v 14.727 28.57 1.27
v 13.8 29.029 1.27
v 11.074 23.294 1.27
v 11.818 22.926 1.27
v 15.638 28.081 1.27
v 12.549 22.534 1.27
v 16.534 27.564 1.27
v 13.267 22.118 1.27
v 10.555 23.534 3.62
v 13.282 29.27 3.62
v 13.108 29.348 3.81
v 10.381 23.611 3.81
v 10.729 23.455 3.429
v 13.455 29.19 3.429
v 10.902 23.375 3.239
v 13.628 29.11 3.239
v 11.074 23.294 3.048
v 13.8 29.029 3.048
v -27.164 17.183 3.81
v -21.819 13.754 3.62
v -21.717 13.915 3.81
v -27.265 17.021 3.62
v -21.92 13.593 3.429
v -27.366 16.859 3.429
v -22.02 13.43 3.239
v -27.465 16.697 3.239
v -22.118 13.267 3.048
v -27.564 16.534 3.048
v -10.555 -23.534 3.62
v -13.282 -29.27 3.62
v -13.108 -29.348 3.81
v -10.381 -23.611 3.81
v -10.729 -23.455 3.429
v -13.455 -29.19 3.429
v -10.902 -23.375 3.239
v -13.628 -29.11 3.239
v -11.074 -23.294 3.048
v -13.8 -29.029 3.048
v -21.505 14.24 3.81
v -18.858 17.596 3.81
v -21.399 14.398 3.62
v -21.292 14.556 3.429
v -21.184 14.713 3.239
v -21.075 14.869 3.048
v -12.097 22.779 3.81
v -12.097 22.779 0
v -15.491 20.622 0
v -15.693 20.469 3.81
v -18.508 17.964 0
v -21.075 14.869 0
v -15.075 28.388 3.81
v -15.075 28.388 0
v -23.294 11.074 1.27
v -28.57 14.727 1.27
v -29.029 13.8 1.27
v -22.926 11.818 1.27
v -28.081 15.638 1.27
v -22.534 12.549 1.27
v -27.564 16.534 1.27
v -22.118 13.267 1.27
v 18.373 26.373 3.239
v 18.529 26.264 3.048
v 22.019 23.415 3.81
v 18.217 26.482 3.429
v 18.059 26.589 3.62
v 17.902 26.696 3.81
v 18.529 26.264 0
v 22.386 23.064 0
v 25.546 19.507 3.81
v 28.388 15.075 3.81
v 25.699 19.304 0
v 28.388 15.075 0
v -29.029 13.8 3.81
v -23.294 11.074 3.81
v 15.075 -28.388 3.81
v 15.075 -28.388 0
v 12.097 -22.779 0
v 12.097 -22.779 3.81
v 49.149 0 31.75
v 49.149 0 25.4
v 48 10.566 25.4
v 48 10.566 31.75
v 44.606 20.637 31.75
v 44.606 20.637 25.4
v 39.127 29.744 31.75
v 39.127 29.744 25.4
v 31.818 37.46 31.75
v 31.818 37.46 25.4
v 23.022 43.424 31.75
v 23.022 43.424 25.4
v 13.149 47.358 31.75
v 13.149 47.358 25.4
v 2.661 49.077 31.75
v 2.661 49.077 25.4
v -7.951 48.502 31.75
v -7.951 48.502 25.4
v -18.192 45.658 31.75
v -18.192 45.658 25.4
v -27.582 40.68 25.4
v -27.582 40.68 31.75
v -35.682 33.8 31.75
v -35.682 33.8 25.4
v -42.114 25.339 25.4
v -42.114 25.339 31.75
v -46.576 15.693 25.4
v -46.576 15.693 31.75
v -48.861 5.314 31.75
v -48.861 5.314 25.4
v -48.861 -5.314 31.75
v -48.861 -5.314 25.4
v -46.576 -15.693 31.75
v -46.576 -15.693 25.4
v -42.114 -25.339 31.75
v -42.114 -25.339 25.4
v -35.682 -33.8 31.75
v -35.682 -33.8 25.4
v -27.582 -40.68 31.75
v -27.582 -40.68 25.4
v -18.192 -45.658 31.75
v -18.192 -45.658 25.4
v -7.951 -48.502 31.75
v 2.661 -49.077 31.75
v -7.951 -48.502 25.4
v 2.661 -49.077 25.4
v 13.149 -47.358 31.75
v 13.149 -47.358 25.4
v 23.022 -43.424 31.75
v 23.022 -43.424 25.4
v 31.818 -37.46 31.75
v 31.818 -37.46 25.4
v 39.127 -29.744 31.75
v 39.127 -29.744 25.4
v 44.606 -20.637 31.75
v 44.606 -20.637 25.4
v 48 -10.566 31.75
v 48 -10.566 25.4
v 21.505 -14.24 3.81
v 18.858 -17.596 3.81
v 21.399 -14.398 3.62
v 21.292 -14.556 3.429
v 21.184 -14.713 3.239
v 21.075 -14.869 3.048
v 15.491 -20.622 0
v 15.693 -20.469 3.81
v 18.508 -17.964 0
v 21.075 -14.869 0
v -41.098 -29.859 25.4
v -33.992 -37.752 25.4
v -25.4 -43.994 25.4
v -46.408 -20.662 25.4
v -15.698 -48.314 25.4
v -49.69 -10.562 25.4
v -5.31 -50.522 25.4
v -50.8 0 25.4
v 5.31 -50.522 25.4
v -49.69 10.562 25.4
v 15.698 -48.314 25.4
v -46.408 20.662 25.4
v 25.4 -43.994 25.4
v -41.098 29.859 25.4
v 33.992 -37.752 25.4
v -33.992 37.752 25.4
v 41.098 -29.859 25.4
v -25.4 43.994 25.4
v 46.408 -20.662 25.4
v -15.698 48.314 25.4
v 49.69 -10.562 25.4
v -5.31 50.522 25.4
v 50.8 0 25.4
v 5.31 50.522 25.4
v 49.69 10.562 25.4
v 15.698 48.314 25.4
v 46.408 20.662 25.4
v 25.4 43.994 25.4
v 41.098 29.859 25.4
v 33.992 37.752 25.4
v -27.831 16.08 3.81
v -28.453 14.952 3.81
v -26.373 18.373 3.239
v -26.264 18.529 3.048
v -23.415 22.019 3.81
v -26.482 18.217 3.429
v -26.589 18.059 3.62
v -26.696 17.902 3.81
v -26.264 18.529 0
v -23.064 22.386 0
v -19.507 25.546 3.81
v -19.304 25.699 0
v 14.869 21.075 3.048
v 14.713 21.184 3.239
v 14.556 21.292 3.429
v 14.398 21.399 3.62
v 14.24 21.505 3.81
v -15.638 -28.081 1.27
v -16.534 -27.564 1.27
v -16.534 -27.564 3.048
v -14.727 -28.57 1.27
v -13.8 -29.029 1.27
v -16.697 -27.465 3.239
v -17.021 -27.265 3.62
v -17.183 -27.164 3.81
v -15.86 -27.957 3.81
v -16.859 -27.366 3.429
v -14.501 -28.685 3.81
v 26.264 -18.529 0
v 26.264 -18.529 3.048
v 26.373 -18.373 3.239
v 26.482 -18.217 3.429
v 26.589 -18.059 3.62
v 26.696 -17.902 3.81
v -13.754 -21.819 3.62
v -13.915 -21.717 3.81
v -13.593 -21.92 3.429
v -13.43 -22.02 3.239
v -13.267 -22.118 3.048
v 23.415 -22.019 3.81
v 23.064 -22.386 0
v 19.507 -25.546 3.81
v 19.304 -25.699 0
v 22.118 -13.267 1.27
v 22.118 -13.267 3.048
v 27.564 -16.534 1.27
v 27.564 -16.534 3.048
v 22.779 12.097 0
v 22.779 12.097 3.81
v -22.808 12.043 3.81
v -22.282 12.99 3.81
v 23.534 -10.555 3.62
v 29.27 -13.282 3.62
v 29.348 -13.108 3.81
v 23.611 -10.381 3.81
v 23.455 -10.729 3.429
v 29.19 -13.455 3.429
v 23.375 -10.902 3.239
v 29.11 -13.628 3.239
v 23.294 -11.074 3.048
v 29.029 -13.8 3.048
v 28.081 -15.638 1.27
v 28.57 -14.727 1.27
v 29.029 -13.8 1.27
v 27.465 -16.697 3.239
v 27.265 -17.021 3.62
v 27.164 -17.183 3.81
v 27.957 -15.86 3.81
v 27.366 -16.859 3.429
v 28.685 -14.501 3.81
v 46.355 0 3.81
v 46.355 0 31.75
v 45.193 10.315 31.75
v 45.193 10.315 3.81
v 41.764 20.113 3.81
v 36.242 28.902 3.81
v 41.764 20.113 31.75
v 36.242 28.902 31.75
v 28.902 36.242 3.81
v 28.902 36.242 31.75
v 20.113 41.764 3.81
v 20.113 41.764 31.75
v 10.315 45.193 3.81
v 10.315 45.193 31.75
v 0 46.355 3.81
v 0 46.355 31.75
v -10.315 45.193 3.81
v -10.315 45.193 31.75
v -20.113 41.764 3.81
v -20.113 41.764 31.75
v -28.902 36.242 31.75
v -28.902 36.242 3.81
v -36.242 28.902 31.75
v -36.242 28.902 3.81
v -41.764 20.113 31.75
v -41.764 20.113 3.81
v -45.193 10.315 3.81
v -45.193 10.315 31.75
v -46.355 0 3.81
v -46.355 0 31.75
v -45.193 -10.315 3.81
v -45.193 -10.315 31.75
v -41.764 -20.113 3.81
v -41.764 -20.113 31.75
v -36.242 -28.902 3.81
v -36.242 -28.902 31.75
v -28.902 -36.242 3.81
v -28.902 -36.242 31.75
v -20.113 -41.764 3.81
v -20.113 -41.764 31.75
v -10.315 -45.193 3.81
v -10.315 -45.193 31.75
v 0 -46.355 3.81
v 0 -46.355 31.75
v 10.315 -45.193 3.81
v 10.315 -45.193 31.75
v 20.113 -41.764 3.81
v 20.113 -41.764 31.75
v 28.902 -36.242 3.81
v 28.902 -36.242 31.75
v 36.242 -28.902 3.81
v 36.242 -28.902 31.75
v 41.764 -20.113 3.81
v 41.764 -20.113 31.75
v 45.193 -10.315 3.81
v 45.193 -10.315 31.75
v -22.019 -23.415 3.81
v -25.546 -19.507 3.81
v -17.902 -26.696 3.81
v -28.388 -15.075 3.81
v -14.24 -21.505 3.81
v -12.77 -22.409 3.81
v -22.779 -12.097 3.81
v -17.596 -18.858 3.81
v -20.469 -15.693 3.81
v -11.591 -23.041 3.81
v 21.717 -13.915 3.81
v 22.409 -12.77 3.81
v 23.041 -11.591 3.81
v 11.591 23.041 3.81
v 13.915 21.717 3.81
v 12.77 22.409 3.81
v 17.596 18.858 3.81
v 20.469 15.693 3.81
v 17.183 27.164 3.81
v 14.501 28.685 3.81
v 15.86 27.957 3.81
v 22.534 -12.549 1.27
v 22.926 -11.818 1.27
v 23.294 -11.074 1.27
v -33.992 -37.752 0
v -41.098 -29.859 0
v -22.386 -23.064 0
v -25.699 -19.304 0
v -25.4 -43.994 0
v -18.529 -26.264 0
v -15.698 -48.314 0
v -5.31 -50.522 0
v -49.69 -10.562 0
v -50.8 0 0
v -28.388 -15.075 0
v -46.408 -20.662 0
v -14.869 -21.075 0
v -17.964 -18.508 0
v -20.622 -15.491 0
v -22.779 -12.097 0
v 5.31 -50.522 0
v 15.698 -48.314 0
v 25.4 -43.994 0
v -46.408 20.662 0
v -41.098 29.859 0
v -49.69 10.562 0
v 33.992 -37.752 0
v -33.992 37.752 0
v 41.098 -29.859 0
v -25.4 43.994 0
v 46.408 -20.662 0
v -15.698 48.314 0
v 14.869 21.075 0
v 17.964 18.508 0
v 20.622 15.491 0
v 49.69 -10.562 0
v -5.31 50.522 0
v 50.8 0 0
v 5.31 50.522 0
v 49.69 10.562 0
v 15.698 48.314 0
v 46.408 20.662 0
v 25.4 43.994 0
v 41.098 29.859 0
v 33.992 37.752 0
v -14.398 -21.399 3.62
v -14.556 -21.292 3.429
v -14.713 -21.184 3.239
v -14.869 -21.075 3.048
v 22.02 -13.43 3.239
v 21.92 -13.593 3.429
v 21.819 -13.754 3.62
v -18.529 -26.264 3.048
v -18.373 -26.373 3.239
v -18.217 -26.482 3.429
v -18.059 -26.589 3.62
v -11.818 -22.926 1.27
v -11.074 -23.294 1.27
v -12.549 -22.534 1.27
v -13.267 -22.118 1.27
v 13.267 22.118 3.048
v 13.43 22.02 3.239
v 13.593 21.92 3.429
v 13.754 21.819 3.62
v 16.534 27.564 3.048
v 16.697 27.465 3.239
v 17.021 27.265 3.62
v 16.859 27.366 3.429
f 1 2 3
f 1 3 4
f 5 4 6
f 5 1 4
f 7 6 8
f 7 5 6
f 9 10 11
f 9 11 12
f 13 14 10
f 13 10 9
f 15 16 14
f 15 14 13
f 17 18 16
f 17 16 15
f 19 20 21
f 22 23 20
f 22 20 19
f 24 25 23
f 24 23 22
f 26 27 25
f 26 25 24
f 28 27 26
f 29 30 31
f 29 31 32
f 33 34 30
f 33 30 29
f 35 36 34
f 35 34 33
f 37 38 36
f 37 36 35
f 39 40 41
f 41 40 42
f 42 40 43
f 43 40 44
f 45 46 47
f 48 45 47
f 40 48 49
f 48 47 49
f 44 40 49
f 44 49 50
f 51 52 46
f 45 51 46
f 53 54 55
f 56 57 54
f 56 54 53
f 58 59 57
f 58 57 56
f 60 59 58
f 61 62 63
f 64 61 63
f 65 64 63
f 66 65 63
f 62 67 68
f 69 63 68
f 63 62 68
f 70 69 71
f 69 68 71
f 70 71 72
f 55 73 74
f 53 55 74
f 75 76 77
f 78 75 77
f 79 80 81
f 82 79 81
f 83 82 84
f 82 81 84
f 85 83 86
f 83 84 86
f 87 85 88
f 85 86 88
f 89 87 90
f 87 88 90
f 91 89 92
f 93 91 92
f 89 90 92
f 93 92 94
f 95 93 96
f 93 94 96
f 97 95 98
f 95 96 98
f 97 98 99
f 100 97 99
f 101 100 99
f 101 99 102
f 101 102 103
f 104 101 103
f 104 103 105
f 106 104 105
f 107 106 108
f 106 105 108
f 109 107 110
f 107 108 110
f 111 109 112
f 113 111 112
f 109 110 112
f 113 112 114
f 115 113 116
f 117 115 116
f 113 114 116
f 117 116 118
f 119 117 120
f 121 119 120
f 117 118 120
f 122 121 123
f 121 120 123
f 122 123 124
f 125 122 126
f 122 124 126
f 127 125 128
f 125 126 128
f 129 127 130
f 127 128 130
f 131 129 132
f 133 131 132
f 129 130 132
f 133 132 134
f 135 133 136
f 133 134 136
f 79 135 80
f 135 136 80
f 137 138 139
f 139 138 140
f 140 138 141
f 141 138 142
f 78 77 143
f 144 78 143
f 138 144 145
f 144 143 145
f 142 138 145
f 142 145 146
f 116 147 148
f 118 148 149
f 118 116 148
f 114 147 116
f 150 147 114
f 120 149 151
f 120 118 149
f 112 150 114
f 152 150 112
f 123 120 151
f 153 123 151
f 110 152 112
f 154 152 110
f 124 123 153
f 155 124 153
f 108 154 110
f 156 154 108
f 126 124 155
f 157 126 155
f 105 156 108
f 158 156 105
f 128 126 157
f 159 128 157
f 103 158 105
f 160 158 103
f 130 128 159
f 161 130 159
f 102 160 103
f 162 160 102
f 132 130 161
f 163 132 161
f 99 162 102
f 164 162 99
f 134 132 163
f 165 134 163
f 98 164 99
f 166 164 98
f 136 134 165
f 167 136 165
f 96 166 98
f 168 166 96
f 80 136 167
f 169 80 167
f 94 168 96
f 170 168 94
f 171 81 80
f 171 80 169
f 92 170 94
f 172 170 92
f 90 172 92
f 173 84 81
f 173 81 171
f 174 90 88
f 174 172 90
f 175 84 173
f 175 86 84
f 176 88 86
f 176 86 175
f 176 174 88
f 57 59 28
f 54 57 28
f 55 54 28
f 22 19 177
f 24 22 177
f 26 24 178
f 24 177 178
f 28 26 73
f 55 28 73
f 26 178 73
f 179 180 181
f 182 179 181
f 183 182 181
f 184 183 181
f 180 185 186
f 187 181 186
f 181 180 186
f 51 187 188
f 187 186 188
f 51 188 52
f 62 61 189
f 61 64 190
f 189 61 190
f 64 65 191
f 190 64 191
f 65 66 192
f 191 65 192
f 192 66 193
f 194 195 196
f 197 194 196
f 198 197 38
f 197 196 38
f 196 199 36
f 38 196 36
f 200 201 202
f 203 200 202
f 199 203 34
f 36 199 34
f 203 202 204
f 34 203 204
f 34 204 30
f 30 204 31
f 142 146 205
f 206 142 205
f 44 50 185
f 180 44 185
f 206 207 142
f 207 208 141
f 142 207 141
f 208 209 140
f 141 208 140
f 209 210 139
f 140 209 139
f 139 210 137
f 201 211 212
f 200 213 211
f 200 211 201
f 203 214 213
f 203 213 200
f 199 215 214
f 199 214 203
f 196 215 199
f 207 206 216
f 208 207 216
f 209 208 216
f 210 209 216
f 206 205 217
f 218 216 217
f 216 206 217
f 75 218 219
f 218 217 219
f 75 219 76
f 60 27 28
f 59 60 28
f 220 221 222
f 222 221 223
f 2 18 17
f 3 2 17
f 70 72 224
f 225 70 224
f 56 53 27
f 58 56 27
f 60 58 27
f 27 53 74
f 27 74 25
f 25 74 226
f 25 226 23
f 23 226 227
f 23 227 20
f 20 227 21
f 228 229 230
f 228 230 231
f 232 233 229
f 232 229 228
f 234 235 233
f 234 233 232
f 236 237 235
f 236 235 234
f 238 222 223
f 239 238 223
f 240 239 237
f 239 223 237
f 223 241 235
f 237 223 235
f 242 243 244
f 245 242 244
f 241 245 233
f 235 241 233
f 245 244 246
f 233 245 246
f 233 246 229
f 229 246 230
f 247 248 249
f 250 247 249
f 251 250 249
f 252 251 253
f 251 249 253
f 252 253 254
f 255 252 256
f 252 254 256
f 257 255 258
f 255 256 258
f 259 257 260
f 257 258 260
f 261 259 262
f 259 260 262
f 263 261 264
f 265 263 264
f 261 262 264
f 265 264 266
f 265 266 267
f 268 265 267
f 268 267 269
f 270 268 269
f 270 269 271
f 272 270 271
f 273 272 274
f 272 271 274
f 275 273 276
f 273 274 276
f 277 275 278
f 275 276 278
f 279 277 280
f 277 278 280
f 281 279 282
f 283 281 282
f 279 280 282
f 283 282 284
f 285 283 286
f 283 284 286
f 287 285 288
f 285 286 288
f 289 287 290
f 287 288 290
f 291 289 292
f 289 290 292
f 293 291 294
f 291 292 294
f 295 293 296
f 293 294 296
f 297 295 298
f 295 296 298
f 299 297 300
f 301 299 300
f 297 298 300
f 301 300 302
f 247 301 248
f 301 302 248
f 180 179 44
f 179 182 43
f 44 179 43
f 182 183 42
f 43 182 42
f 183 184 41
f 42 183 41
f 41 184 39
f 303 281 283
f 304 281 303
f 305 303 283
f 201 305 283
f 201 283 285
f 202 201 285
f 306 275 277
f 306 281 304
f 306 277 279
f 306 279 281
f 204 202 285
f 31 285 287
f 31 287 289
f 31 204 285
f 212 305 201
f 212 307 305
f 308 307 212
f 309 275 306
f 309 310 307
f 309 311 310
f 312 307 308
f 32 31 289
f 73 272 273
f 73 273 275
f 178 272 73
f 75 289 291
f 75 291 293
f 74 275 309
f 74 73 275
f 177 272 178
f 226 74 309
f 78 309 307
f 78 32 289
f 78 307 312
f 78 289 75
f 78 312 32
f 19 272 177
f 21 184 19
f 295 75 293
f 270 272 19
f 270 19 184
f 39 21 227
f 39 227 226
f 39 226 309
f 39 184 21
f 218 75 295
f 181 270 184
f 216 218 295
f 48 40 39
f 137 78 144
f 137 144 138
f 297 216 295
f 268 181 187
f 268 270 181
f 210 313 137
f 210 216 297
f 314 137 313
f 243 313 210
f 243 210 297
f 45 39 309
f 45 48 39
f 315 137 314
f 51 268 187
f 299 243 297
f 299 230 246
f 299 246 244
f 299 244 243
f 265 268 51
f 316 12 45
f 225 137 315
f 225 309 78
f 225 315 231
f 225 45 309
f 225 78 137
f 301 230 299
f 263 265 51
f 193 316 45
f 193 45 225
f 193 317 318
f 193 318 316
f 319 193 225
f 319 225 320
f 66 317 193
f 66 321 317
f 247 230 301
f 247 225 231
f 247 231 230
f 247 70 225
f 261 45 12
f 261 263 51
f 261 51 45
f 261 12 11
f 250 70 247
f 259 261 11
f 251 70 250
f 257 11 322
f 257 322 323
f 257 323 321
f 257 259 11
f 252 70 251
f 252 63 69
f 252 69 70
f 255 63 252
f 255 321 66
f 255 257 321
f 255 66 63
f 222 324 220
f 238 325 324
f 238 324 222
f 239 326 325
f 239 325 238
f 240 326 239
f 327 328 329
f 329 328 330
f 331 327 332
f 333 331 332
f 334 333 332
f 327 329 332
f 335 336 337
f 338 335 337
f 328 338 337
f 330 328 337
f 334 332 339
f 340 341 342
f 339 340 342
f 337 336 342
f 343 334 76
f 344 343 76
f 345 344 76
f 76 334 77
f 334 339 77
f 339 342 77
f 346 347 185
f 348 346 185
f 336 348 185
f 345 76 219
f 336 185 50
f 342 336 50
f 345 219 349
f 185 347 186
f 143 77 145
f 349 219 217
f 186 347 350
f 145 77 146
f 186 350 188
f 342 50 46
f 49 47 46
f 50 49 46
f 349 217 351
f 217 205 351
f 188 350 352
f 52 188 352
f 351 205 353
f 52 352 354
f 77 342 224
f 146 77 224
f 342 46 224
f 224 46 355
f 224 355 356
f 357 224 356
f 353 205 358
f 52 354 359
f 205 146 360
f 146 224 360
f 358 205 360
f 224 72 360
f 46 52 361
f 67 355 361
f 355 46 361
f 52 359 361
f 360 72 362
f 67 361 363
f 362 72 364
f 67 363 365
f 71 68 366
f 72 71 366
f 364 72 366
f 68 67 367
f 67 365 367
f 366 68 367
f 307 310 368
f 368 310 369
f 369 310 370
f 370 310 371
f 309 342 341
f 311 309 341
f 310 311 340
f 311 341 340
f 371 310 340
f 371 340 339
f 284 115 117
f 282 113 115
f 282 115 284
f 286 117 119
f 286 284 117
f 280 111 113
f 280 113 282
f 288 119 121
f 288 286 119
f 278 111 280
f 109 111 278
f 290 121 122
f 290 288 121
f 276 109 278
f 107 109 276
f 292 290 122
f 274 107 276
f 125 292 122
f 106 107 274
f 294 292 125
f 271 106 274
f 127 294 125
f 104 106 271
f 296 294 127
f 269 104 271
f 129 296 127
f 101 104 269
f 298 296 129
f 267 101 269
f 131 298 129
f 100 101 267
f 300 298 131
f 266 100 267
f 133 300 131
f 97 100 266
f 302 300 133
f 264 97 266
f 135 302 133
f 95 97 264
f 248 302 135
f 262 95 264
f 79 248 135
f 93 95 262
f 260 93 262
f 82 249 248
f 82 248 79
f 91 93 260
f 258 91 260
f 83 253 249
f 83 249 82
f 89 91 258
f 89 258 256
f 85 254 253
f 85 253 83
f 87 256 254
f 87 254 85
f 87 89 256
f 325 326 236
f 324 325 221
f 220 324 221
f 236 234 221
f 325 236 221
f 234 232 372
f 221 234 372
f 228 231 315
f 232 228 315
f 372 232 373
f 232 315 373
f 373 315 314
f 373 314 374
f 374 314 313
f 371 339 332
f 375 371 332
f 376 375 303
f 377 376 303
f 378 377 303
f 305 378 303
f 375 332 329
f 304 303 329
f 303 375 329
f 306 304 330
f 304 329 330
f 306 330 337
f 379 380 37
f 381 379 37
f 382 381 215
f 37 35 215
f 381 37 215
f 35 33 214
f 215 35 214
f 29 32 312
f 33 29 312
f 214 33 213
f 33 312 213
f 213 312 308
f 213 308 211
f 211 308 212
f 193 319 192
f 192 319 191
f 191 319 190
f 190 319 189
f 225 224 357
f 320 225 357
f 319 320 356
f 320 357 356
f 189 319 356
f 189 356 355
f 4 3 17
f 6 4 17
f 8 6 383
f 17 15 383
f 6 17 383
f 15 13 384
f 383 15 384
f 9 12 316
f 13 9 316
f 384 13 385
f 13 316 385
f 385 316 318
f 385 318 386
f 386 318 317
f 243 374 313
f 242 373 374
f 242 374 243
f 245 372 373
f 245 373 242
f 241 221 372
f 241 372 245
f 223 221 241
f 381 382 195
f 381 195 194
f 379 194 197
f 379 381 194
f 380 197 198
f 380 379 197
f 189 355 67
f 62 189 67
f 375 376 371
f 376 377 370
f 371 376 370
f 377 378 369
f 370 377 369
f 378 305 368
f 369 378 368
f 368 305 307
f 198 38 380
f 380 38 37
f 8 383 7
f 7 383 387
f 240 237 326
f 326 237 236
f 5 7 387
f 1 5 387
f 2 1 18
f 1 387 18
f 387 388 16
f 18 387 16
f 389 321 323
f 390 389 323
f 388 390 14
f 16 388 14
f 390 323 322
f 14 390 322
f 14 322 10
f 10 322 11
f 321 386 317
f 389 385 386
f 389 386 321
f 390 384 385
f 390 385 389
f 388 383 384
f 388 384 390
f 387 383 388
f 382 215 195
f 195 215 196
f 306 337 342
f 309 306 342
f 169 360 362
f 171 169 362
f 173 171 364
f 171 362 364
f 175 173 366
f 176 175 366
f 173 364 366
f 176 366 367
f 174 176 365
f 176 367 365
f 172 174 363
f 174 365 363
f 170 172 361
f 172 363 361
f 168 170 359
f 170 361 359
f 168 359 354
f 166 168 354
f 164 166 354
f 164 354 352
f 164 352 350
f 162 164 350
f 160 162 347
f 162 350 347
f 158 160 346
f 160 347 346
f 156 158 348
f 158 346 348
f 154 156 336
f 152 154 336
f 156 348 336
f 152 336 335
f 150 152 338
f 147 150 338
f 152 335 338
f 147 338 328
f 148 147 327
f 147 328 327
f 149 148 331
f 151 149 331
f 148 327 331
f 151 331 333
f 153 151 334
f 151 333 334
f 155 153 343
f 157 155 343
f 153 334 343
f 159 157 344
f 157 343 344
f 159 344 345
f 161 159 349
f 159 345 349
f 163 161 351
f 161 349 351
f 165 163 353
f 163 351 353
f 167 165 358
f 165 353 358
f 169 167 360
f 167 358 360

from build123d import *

# Parameters (mm, degrees)
F0_R     = 50.8
F1_DEPTH = 25.4
F2_R     = 49.149
F3_DEPTH = 6.35
F4_R     = 46.355
F5_DEPTH = 27.94
F7_DEPTH = 31.751
F9_DEPTH = 2.54
F10_SIZE = 0.762


with BuildPart() as f1:
    # F0 (on Top) → F1 (new body)
    with BuildSketch(Plane.XY):
        Circle(F0_R)
    extrude(amount=F1_DEPTH)

    # F2 (on face) → F3 (join)
    with BuildSketch(Plane.XY.offset(25.4)):
        Circle(F2_R)
    extrude(amount=F3_DEPTH)

    # F4 (on face) → F5 (cut)
    with BuildSketch(Plane.XY.offset(31.75)):
        Circle(F4_R)
    extrude(amount=-F5_DEPTH, mode=Mode.SUBTRACT)

    # F6 (on face) → F7 (cut, through all)
    with BuildSketch(Plane(origin=(0, 0, 0), x_dir=(1, 0, 0), z_dir=(0, 0, -1))):
        with BuildLine():
            ThreePointArc((26.263693, 18.529348), (21.249092, 24.116268), (15.075286, 28.387569))
            Line((15.075286, 28.387569), (12.097015, 22.779325))
            ThreePointArc((12.097015, 22.779325), (17.051125, 19.351862), (21.075042, 14.868693))
            Line((21.075042, 14.868693), (26.263693, 18.529348))
        make_face()
        with BuildLine():
            ThreePointArc((-18.529348, 26.263693), (-24.116268, 21.249092), (-28.387569, 15.075286))
            Line((-28.387569, 15.075286), (-22.779325, 12.097015))
            ThreePointArc((-22.779325, 12.097015), (-19.351862, 17.051125), (-14.868693, 21.075042))
            Line((-14.868693, 21.075042), (-18.529348, 26.263693))
        make_face()
        with BuildLine():
            ThreePointArc((-26.263693, -18.529348), (-21.249092, -24.116268), (-15.075286, -28.387569))
            Line((-15.075286, -28.387569), (-12.097015, -22.779325))
            ThreePointArc((-12.097015, -22.779325), (-17.051125, -19.351862), (-21.075042, -14.868693))
            Line((-21.075042, -14.868693), (-26.263693, -18.529348))
        make_face()
        with BuildLine():
            ThreePointArc((18.529348, -26.263693), (24.116268, -21.249092), (28.387569, -15.075286))
            Line((28.387569, -15.075286), (22.779325, -12.097015))
            ThreePointArc((22.779325, -12.097015), (19.351862, -17.051125), (14.868693, -21.075042))
            Line((14.868693, -21.075042), (18.529348, -26.263693))
        make_face()
    extrude(amount=-F7_DEPTH, mode=Mode.SUBTRACT)

    # F8 (on face) → F9 (cut)
    with BuildSketch(Plane.XY.offset(3.81)):
        with BuildLine():
            Line((-22.118151, 13.267361), (-27.563613, 16.533769))
            ThreePointArc((-27.563613, 16.533769), (-28.329177, 15.184731), (-29.028766, 13.800328))
            Line((-29.028766, 13.800328), (-23.293849, 11.073938))
            ThreePointArc((-23.293849, 11.073938), (-22.73247, 12.184838), (-22.118151, 13.267361))
        make_face()
        with BuildLine():
            Line((-13.267361, -22.118151), (-16.533769, -27.563613))
            ThreePointArc((-16.533769, -27.563613), (-15.184731, -28.329177), (-13.800328, -29.028766))
            Line((-13.800328, -29.028766), (-11.073938, -23.293849))
            ThreePointArc((-11.073938, -23.293849), (-12.184838, -22.73247), (-13.267361, -22.118151))
        make_face()
        with BuildLine():
            Line((22.118151, -13.267361), (27.563613, -16.533769))
            ThreePointArc((27.563613, -16.533769), (28.329177, -15.184731), (29.028766, -13.800328))
            Line((29.028766, -13.800328), (23.293849, -11.073938))
            ThreePointArc((23.293849, -11.073938), (22.73247, -12.184838), (22.118151, -13.267361))
        make_face()
        with BuildLine():
            Line((13.267361, 22.118151), (16.533769, 27.563613))
            ThreePointArc((16.533769, 27.563613), (15.184731, 28.329177), (13.800328, 29.028766))
            Line((13.800328, 29.028766), (11.073938, 23.293849))
            ThreePointArc((11.073938, 23.293849), (12.184838, 22.73247), (13.267361, 22.118151))
        make_face()
    extrude(amount=-F9_DEPTH, mode=Mode.SUBTRACT)

    # F10
    f10_edges = [f1.edges().sort_by_distance(p)[0] for p in [
        (-23.669367, 16.69902, 3.81),
        (-24.840882, 14.900565, 3.81),
        (12.437133, 26.161307, 3.81),
        (14.900565, 24.840882, 3.81),
        (24.840882, -14.900565, 3.81),
        (26.161307, -12.437133, 3.81),
        (-12.437133, -26.161307, 3.81),
        (-14.900565, -24.840882, 3.81),
        (23.669367, -16.69902, 3.81),
        (16.69902, 23.669367, 3.81),
        (-16.69902, -23.669367, 3.81),
    ]]
    chamfer(f10_edges, length=F10_SIZE)


solid = f1.part
